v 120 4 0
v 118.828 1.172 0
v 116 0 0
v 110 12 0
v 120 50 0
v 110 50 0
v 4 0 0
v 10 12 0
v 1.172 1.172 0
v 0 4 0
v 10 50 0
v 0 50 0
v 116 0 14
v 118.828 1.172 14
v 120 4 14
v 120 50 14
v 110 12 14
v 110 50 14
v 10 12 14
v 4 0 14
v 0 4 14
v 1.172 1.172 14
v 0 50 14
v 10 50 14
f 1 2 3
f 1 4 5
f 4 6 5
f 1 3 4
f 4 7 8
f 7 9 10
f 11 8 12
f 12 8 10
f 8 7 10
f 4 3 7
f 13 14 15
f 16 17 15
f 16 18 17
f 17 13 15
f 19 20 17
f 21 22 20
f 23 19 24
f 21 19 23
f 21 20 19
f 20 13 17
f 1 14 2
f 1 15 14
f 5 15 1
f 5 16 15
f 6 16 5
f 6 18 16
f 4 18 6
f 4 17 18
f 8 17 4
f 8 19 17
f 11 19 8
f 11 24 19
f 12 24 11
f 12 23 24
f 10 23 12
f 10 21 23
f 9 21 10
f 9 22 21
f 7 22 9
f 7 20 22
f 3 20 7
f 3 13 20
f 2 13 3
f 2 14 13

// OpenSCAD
$fn = 32;

// ----------------------------------------------------------------------
// Heat sink frame: 120 x 50 mm frame, 10 mm walls
// ----------------------------------------------------------------------

// --- parameters (mm) ---
profile_height = 14;      // extrusion height
profile_points = 12;      // points of the closed outline

profile = [[0, 4], [1.172, 1.172], [4, 0], [116, 0], [118.828, 1.172], [120, 4], [120, 50], [110, 50], [110, 12], [10, 12], [10, 50], [0, 50]];  // single closed polygon, 12 points, counter clockwise

// --- the one profile operation ---
linear_extrude(height = profile_height) polygon(points = profile);
